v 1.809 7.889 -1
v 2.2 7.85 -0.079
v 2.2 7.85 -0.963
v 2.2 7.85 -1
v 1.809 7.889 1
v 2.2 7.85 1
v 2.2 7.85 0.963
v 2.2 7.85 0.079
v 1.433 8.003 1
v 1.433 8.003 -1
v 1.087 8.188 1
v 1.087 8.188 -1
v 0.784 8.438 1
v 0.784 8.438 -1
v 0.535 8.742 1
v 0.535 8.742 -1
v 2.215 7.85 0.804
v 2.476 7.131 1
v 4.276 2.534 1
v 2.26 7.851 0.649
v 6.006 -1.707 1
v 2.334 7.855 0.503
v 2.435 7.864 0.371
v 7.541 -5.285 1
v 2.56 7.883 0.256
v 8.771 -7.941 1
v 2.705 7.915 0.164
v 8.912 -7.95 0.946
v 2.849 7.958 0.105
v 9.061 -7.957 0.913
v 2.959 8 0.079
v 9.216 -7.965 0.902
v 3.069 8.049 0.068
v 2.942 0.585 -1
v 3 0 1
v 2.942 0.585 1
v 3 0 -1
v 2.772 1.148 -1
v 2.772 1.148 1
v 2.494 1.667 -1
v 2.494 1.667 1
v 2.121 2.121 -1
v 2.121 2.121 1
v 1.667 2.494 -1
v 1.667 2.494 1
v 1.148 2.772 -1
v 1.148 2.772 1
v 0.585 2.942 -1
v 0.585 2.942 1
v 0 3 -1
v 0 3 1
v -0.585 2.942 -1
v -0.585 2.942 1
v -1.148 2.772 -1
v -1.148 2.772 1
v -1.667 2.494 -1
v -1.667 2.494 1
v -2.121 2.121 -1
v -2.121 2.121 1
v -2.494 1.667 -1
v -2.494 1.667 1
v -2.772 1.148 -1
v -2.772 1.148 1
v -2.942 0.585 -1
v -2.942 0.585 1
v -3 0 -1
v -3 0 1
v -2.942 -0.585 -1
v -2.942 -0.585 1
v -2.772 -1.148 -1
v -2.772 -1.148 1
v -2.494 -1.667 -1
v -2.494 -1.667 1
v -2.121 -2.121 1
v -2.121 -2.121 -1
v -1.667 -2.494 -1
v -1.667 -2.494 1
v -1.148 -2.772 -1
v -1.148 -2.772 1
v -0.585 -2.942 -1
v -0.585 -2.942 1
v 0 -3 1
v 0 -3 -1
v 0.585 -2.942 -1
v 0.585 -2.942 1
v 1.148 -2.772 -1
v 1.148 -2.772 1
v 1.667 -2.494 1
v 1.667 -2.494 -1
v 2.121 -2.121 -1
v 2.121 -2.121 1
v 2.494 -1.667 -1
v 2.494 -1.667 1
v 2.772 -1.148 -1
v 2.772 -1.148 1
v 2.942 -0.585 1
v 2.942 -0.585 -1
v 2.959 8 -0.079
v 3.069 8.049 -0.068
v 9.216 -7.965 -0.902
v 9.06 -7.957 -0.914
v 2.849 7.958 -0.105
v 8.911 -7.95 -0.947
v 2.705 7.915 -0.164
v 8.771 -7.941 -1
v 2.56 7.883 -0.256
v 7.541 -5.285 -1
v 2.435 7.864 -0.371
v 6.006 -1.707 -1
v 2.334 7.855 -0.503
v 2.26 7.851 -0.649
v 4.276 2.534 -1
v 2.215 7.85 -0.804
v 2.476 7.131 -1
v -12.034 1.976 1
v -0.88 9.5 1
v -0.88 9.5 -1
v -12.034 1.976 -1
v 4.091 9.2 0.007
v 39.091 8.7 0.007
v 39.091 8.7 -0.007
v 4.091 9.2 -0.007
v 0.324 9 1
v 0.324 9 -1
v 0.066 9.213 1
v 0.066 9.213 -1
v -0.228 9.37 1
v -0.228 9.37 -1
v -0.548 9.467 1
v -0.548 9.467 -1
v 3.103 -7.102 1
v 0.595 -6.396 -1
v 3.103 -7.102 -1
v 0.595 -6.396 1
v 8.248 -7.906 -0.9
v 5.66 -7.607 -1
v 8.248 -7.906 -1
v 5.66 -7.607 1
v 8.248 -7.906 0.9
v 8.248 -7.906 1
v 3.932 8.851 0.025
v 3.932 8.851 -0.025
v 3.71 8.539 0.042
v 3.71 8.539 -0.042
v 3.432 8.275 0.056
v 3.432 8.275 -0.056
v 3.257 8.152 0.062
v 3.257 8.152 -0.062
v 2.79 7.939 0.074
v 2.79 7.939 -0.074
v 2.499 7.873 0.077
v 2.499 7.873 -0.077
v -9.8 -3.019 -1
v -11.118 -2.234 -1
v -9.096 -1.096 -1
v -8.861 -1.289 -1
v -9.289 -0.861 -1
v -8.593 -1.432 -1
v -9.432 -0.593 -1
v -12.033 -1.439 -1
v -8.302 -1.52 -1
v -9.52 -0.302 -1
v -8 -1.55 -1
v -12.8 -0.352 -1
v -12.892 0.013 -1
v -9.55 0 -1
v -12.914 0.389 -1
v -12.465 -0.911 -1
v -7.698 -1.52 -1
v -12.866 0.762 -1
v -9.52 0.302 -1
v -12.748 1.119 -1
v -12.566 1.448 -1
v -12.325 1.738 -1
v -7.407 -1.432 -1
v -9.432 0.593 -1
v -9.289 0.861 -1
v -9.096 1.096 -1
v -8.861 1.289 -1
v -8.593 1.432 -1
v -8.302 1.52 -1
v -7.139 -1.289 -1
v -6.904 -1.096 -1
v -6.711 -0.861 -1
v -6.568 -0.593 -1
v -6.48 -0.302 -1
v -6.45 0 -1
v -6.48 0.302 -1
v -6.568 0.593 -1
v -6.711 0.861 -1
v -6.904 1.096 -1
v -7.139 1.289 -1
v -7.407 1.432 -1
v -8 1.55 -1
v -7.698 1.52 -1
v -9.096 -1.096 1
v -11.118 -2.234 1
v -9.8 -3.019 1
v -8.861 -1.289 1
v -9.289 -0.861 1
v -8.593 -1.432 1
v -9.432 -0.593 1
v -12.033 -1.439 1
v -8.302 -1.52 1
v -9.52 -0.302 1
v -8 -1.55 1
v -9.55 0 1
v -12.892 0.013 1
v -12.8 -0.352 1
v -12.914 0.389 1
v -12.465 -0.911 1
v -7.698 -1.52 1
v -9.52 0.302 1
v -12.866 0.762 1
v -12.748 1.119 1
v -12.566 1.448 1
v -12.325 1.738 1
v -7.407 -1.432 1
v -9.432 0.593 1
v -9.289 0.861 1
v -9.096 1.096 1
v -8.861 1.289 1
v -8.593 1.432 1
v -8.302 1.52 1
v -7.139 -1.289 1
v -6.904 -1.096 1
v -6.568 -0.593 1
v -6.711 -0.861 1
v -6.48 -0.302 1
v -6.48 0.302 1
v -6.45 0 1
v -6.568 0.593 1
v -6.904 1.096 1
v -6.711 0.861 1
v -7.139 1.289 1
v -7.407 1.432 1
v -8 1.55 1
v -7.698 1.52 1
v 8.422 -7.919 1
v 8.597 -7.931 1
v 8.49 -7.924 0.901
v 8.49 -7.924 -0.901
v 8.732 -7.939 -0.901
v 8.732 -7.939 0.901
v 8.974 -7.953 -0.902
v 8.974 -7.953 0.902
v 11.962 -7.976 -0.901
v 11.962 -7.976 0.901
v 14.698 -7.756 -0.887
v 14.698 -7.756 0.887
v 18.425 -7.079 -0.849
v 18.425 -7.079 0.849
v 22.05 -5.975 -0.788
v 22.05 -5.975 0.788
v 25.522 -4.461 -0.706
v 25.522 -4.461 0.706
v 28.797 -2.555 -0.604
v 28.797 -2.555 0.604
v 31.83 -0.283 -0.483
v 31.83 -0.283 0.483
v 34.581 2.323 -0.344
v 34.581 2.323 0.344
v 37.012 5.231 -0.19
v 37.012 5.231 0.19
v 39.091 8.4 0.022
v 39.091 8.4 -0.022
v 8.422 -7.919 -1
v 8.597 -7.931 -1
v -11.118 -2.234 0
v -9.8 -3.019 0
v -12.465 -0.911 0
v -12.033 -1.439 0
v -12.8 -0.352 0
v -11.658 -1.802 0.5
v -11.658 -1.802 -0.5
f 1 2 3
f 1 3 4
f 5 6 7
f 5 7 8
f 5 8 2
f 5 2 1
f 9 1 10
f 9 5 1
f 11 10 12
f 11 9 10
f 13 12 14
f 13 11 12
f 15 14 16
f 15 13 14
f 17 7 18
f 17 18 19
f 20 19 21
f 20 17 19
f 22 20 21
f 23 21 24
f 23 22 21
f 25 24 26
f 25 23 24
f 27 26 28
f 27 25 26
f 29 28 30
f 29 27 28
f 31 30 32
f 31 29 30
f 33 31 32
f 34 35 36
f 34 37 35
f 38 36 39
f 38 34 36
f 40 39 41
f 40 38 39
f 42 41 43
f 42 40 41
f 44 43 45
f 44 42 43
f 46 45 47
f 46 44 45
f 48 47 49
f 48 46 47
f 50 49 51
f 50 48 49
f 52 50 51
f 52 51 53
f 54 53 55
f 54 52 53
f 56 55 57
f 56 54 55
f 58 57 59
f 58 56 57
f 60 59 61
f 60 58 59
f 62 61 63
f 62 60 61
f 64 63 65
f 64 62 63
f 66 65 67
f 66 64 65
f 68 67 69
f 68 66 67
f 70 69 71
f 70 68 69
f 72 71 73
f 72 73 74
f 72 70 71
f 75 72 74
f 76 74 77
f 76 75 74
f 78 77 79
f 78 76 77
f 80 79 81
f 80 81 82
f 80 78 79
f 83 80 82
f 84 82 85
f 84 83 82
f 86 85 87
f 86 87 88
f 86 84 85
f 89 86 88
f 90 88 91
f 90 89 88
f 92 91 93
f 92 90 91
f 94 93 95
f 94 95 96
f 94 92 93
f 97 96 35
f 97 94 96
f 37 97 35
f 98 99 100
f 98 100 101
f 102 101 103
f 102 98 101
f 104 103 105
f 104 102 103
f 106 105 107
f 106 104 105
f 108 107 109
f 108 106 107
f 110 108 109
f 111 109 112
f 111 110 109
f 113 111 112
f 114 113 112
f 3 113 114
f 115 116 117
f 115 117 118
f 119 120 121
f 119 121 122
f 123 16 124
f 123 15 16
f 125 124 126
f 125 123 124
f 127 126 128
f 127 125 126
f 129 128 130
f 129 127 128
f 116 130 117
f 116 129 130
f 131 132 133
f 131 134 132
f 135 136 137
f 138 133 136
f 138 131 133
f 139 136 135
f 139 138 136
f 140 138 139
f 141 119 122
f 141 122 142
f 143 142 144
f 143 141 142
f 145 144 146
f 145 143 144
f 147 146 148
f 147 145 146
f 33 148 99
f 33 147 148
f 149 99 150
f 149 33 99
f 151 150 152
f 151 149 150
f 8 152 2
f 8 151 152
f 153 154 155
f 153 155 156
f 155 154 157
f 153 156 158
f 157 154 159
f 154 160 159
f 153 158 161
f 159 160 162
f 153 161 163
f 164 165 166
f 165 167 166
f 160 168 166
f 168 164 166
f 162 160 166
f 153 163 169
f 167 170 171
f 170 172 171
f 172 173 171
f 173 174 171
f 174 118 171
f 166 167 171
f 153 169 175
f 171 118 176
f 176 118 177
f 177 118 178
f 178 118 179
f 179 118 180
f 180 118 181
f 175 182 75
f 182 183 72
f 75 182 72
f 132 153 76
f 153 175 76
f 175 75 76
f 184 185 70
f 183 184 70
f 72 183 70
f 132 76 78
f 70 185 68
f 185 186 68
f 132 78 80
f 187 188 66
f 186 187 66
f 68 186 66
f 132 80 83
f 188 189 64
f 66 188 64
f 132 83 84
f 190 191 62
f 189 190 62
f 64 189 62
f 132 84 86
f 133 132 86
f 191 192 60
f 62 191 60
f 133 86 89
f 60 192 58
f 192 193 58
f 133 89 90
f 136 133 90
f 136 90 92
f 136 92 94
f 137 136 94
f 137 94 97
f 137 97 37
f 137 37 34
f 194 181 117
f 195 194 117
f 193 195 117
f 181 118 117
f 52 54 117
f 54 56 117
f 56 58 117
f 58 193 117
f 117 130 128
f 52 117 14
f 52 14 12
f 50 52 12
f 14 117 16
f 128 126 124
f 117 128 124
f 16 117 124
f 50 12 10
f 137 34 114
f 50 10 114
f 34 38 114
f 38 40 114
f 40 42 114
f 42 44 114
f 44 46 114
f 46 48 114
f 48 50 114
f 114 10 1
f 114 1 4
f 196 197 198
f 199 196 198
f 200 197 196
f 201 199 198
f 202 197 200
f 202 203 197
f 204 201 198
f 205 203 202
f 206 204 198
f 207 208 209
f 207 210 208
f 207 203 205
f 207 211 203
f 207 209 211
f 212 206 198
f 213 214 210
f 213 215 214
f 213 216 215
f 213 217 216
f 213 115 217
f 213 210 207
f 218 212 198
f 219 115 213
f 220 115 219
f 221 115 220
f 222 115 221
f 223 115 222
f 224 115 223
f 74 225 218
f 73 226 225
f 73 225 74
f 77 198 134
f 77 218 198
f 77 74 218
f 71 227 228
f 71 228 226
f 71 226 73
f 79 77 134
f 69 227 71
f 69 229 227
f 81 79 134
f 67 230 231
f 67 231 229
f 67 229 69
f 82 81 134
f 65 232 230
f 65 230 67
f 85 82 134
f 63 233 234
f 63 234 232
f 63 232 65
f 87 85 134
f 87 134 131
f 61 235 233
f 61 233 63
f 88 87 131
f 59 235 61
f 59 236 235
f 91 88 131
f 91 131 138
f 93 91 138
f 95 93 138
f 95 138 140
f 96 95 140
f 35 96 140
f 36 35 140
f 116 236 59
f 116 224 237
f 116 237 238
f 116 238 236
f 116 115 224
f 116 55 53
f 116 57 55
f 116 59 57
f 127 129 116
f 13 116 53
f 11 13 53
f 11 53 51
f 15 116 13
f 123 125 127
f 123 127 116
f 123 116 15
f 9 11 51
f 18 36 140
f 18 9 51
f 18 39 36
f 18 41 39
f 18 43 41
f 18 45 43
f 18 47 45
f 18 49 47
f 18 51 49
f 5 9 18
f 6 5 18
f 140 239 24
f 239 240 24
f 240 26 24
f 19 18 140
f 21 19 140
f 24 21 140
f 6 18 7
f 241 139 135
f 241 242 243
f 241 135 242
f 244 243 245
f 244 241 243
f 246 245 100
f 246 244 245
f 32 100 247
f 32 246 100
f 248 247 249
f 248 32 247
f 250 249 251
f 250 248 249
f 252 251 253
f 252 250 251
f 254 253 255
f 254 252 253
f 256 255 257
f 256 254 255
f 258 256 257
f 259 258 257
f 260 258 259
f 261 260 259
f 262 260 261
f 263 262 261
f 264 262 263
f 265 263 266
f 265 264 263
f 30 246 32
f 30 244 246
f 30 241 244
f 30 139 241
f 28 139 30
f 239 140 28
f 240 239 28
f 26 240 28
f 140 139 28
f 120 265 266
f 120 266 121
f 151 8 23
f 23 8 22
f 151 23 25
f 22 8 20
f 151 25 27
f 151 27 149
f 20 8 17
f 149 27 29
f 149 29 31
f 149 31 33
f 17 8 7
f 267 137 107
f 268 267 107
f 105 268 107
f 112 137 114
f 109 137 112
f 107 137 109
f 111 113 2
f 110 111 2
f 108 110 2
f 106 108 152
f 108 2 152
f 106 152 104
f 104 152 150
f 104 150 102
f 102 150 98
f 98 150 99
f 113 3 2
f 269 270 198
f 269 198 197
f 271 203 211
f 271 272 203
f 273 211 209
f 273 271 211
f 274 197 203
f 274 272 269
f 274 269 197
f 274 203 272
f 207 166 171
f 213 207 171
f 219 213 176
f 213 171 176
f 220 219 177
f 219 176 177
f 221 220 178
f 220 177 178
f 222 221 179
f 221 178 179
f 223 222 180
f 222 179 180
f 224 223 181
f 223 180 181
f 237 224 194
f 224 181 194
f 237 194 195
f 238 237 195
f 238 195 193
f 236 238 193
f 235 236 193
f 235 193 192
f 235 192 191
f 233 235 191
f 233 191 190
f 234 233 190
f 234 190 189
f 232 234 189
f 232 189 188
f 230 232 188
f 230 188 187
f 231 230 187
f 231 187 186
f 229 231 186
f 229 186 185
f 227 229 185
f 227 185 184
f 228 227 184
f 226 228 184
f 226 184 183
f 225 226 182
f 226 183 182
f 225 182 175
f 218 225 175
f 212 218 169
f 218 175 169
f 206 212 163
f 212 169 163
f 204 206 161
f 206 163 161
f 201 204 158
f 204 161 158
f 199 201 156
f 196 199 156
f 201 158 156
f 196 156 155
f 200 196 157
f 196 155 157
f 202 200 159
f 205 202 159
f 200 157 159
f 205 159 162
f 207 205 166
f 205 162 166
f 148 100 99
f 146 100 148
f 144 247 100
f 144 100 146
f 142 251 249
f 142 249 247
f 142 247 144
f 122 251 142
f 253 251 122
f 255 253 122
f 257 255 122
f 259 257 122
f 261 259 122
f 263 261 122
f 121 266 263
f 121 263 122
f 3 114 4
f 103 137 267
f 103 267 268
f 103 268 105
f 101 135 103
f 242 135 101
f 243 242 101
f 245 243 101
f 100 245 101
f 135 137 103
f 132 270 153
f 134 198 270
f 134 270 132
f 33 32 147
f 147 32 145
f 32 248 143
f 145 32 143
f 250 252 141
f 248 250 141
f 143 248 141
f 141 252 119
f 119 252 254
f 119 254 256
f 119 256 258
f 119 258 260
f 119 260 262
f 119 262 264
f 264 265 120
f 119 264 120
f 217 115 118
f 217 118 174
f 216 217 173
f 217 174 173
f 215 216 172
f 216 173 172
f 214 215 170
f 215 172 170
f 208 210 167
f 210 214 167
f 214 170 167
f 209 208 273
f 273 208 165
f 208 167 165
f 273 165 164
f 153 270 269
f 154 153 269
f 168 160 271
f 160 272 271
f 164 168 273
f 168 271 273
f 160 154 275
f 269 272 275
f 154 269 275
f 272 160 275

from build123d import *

# Parameters (mm, degrees)
SCHIZZO1_R                   = 3
ESTRUSIONE_ESTRUSIONE1_DEPTH = 1
ESTRUSIONE_ESTRUSIONE2_DEPTH = 0.95
SMUSSO1_SIZE                 = 18
SMUSSO1_SIZE_2               = 0.943340027
SMUSSO2_SIZE                 = 18
SMUSSO2_SIZE_2               = 0.943340027
RACCORDO1_R                  = 0.9
RACCORDO2_R                  = 0.9
TAGLIO_ESTRUSIONE1_DEPTH     = 10
RACCORDO3_R                  = 2
SCHIZZO3_R                   = 1.55
TAGLIO_ESTRUSIONE2_DEPTH     = 41.278810137


with BuildPart() as part:
    # Schizzo1 → Estrusione-Estrusione1 (new, symmetric)
    with BuildSketch(Plane.XY):
        with BuildLine():
            Line((-0.88, 9.5), (-19.130944839, 9.5))
            ThreePointArc((-19.130944839, 9.5), (-20.501263026, 8.610104965), (-20.245662077, 6.99630409))
            Line((-20.245662077, 6.99630409), (-15.960328698, 2.236959209))
            Line((-15.960328698, 2.236959209), (-14.839064722, 1.115695234))
            ThreePointArc((-14.839064722, 1.115695234), (-14.577677448, 0.895591951), (-14.282636649, 0.723197957))
            ThreePointArc((-14.282636649, 0.723197957), (-13.491665822, 0.254040408), (-12.8, -0.352047083))
            add(Edge.make_bspline(
                [(-9.8, -3.018897494), (-12.016366306, -1.919392636), (-12.8, -0.352047083)],
                knots=[0, 0, 0, 0.799118898, 0.799118898, 0.799118898], degree=2))
            Line((-9.8, -3.018897494), (0.594713885, -6.396344771))
            ThreePointArc((0.594713885, -6.396344771), (4.37641373, -7.379985604), (8.248348818, -7.906219091))
            Line((8.248348818, -7.906219091), (2.2, 7.850268275))
            ThreePointArc((2.2, 7.850268275), (1.255676497, 8.087244418), (0.535135135, 8.742015153))
            ThreePointArc((0.535135135, 8.742015153), (-0.077325022, 9.298570279), (-0.88, 9.5))
        make_face()
        Circle(SCHIZZO1_R, mode=Mode.SUBTRACT)
    extrude(amount=ESTRUSIONE_ESTRUSIONE1_DEPTH, both=True)

    # Schizzo1<4> → Estrusione-Estrusione2 (add, symmetric)
    with BuildSketch(Plane.XY):
        with BuildLine():
            ThreePointArc((4.091335816, 9.2), (3.361779551, 8.222303818), (2.2, 7.850268275))
            Line((2.2, 7.850268275), (8.248348818, -7.906219091))
            ThreePointArc((8.248348818, -7.906219091), (26.021901415, -4.20199667), (39.091335816, 8.4))
            Line((39.091335816, 8.4), (39.091335816, 8.7))
            Line((39.091335816, 8.7), (4.091335816, 9.2))
        make_face()
    extrude(amount=ESTRUSIONE_ESTRUSIONE2_DEPTH, both=True)

    # Smusso1
    # the kernel refuses this chamfer: 18, 0.943340027 mm, written as the material it takes off along each edge
    with BuildSketch(Plane(origin=(85.88418926, 8.031530665, 0.95), x_dir=(-0.01428422784103612, -0.9998959488725246, 0.002013023422382226), z_dir=(-0.99989797479951, 0.014284256782850195, 0))) as smusso1_piece_1_section:
        Polygon((SMUSSO1_SIZE * 0.999997973866, -SMUSSO1_SIZE * 0.00201302342238), (-SMUSSO1_SIZE_2 * 0.00201302342258, -SMUSSO1_SIZE_2 * 0.999997973967), (0, 0), align=None)
    smusso1_piece_1 = extrude(amount=128.598827208, mode=Mode.PRIVATE)
    smusso1_piece_1 = split(smusso1_piece_1, bisect_by=Plane(origin=(5.771356931, -1.453434613, 0.613202149), z_dir=(0.9335804264972009, 0.3583679495453028, 0)), keep=Keep.TOP, mode=Mode.PRIVATE)
    add(smusso1_piece_1, mode=Mode.SUBTRACT)

    # Smusso2
    # the kernel refuses this chamfer: 18, 0.943340027 mm, written as the material it takes off along each edge
    with BuildSketch(Plane(origin=(85.88418926, 8.031530665, -0.95), x_dir=(-0.01428422784103612, -0.9998959488725246, -0.002013023422382226), z_dir=(-0.99989797479951, 0.014284256782850195, 0))) as smusso2_piece_1_section:
        Polygon((SMUSSO2_SIZE * 0.999997973866, SMUSSO2_SIZE * 0.00201302342238), (-SMUSSO2_SIZE_2 * 0.00201302342258, SMUSSO2_SIZE_2 * 0.999997973967), (0, 0), align=None)
    smusso2_piece_1 = extrude(amount=128.598827208, mode=Mode.PRIVATE)
    smusso2_piece_1 = split(smusso2_piece_1, bisect_by=Plane(origin=(5.771356931, -1.453434613, -0.613202149), z_dir=(0.9335804264972009, 0.3583679495453028, 0)), keep=Keep.TOP, mode=Mode.PRIVATE)
    add(smusso2_piece_1, mode=Mode.SUBTRACT)

    # Raccordo1
    # the kernel refuses this fillet: 0.9 mm, written as the material it adds along each edge
    with BuildSketch(Plane(origin=(1.410141131, 9.907920978, -0.028429649), x_dir=(-0.017415293659521727, 0.04536839107084769, 0.9988185103603132), z_dir=(0.35794454152552274, -0.9324774108955555, 0.048596124964905896))) as raccordo1_piece_1_section:
        with BuildLine():
            CenterArc((RACCORDO1_R * 0.980734011967, -RACCORDO1_R), RACCORDO1_R, 90, 88.885438442)
            Line((-RACCORDO1_R * 0.0190767888902, -RACCORDO1_R * 0.980548457933), (0, 0))
            Line((0, 0), (RACCORDO1_R * 0.980734011967, 0))
        make_face()
    raccordo1_piece_1 = extrude(amount=21.310749772, mode=Mode.PRIVATE)
    raccordo1_piece_1 = raccordo1_piece_1 & Plane(origin=(10.715020451, 24.750756137, 0.600477284), x_dir=(-0.30901699437494573, -0.9510565162951542, 0), z_dir=(0, 0, 1)) * Cylinder(32.75, 47, mode=Mode.PRIVATE)
    raccordo1_piece_1 = split(raccordo1_piece_1, bisect_by=Plane(origin=(5.151176086, 0.789201867, 1), z_dir=(0, 0, -1)), keep=Keep.TOP, mode=Mode.PRIVATE)
    raccordo1_piece_1 = raccordo1_piece_1 - Plane(origin=(2.2, 9.850268275, 0.600477284), x_dir=(0, -1, 0), z_dir=(0, 0, 1)) * Cylinder(2, 47, mode=Mode.PRIVATE)
    add(raccordo1_piece_1)

    # Raccordo2
    # the kernel refuses this fillet: 0.9 mm, written as the material it adds along each edge
    with BuildSketch(Plane(origin=(1.410141131, 9.907920978, 0.028429649), x_dir=(-0.017415293659511128, 0.04536839107085176, -0.9988185103603133), z_dir=(0.35794454152552274, -0.9324774108955555, -0.048596124964905896))) as raccordo2_piece_1_section:
        with BuildLine():
            CenterArc((RACCORDO2_R * 0.980734011967, RACCORDO2_R), RACCORDO2_R, 181.114561558, 88.885438442)
            Line((-RACCORDO2_R * 0.0190767888902, RACCORDO2_R * 0.980548457933), (0, 0))
            Line((0, 0), (RACCORDO2_R * 0.980734011967, 0))
        make_face()
    raccordo2_piece_1 = extrude(amount=21.310749772, mode=Mode.PRIVATE)
    raccordo2_piece_1 = split(raccordo2_piece_1, bisect_by=Plane(origin=(5.151178194, 0.789195879, -1), z_dir=(0, 0, 1)), keep=Keep.TOP, mode=Mode.PRIVATE)
    raccordo2_piece_1 = raccordo2_piece_1 & Plane(origin=(10.715020451, 24.750756137, -0.600477223), x_dir=(-0.3090169943750401, -0.9510565162951234, 0), z_dir=(0, 0, 1)) * Cylinder(32.75, 47, mode=Mode.PRIVATE)
    raccordo2_piece_1 = raccordo2_piece_1 - Plane(origin=(2.2, 9.850268275, -0.600477223), x_dir=(0, -1, 0), z_dir=(0, 0, 1)) * Cylinder(2, 47, mode=Mode.PRIVATE)
    add(raccordo2_piece_1)

    # Schizzo2 → Taglio-Estrusione1 (cut)
    with BuildSketch(Plane.XY.offset(1)):
        Polygon((-0.88, 9.5), (-30.88, -10.735255505), (-30.88, 9.5), align=None)
    extrude(amount=-TAGLIO_ESTRUSIONE1_DEPTH, mode=Mode.SUBTRACT)

    # Raccordo3
    # the kernel refuses this fillet: 2 mm, written as the material it takes off along each edge
    with BuildSketch(Plane(origin=(-14.059482684, 0.610326682, -7.107620692), x_dir=(0.7945891525397701, -0.6071474933375991, 0), z_dir=(0, 0, 1))) as raccordo3_piece_1:
        with BuildLine():
            CenterArc((2.675251835, 1.676756542), RACCORDO3_R, 161.383532721, 75.585730468)
            Line((0.779898436, 2.315219927), (0.741991368, 2.327989195))
            Line((0.741991368, 2.327989195), (-0.037907068, 0.012769268))
            Line((-0.037907068, 0.012769268), (0.006340296, -0.039494312))
            ThreePointArc((0.006340296, -0.039494312), (0.792537049, 0.023211061), (1.563270543, -0.033535131))
            Line((1.563270543, -0.033535131), (1.585074098, 0))
        make_face()
    extrude(amount=14.215241383, mode=Mode.SUBTRACT)

    # Schizzo3 → Taglio-Estrusione2 (cut, through all)
    with BuildSketch(Plane(origin=(0, 0, -1), x_dir=(-1, 0, 0), z_dir=(0, 0, -1))):
        with Locations((8, 0)):
            Circle(SCHIZZO3_R)
    extrude(amount=-TAGLIO_ESTRUSIONE2_DEPTH, mode=Mode.SUBTRACT)


solid = part.part
